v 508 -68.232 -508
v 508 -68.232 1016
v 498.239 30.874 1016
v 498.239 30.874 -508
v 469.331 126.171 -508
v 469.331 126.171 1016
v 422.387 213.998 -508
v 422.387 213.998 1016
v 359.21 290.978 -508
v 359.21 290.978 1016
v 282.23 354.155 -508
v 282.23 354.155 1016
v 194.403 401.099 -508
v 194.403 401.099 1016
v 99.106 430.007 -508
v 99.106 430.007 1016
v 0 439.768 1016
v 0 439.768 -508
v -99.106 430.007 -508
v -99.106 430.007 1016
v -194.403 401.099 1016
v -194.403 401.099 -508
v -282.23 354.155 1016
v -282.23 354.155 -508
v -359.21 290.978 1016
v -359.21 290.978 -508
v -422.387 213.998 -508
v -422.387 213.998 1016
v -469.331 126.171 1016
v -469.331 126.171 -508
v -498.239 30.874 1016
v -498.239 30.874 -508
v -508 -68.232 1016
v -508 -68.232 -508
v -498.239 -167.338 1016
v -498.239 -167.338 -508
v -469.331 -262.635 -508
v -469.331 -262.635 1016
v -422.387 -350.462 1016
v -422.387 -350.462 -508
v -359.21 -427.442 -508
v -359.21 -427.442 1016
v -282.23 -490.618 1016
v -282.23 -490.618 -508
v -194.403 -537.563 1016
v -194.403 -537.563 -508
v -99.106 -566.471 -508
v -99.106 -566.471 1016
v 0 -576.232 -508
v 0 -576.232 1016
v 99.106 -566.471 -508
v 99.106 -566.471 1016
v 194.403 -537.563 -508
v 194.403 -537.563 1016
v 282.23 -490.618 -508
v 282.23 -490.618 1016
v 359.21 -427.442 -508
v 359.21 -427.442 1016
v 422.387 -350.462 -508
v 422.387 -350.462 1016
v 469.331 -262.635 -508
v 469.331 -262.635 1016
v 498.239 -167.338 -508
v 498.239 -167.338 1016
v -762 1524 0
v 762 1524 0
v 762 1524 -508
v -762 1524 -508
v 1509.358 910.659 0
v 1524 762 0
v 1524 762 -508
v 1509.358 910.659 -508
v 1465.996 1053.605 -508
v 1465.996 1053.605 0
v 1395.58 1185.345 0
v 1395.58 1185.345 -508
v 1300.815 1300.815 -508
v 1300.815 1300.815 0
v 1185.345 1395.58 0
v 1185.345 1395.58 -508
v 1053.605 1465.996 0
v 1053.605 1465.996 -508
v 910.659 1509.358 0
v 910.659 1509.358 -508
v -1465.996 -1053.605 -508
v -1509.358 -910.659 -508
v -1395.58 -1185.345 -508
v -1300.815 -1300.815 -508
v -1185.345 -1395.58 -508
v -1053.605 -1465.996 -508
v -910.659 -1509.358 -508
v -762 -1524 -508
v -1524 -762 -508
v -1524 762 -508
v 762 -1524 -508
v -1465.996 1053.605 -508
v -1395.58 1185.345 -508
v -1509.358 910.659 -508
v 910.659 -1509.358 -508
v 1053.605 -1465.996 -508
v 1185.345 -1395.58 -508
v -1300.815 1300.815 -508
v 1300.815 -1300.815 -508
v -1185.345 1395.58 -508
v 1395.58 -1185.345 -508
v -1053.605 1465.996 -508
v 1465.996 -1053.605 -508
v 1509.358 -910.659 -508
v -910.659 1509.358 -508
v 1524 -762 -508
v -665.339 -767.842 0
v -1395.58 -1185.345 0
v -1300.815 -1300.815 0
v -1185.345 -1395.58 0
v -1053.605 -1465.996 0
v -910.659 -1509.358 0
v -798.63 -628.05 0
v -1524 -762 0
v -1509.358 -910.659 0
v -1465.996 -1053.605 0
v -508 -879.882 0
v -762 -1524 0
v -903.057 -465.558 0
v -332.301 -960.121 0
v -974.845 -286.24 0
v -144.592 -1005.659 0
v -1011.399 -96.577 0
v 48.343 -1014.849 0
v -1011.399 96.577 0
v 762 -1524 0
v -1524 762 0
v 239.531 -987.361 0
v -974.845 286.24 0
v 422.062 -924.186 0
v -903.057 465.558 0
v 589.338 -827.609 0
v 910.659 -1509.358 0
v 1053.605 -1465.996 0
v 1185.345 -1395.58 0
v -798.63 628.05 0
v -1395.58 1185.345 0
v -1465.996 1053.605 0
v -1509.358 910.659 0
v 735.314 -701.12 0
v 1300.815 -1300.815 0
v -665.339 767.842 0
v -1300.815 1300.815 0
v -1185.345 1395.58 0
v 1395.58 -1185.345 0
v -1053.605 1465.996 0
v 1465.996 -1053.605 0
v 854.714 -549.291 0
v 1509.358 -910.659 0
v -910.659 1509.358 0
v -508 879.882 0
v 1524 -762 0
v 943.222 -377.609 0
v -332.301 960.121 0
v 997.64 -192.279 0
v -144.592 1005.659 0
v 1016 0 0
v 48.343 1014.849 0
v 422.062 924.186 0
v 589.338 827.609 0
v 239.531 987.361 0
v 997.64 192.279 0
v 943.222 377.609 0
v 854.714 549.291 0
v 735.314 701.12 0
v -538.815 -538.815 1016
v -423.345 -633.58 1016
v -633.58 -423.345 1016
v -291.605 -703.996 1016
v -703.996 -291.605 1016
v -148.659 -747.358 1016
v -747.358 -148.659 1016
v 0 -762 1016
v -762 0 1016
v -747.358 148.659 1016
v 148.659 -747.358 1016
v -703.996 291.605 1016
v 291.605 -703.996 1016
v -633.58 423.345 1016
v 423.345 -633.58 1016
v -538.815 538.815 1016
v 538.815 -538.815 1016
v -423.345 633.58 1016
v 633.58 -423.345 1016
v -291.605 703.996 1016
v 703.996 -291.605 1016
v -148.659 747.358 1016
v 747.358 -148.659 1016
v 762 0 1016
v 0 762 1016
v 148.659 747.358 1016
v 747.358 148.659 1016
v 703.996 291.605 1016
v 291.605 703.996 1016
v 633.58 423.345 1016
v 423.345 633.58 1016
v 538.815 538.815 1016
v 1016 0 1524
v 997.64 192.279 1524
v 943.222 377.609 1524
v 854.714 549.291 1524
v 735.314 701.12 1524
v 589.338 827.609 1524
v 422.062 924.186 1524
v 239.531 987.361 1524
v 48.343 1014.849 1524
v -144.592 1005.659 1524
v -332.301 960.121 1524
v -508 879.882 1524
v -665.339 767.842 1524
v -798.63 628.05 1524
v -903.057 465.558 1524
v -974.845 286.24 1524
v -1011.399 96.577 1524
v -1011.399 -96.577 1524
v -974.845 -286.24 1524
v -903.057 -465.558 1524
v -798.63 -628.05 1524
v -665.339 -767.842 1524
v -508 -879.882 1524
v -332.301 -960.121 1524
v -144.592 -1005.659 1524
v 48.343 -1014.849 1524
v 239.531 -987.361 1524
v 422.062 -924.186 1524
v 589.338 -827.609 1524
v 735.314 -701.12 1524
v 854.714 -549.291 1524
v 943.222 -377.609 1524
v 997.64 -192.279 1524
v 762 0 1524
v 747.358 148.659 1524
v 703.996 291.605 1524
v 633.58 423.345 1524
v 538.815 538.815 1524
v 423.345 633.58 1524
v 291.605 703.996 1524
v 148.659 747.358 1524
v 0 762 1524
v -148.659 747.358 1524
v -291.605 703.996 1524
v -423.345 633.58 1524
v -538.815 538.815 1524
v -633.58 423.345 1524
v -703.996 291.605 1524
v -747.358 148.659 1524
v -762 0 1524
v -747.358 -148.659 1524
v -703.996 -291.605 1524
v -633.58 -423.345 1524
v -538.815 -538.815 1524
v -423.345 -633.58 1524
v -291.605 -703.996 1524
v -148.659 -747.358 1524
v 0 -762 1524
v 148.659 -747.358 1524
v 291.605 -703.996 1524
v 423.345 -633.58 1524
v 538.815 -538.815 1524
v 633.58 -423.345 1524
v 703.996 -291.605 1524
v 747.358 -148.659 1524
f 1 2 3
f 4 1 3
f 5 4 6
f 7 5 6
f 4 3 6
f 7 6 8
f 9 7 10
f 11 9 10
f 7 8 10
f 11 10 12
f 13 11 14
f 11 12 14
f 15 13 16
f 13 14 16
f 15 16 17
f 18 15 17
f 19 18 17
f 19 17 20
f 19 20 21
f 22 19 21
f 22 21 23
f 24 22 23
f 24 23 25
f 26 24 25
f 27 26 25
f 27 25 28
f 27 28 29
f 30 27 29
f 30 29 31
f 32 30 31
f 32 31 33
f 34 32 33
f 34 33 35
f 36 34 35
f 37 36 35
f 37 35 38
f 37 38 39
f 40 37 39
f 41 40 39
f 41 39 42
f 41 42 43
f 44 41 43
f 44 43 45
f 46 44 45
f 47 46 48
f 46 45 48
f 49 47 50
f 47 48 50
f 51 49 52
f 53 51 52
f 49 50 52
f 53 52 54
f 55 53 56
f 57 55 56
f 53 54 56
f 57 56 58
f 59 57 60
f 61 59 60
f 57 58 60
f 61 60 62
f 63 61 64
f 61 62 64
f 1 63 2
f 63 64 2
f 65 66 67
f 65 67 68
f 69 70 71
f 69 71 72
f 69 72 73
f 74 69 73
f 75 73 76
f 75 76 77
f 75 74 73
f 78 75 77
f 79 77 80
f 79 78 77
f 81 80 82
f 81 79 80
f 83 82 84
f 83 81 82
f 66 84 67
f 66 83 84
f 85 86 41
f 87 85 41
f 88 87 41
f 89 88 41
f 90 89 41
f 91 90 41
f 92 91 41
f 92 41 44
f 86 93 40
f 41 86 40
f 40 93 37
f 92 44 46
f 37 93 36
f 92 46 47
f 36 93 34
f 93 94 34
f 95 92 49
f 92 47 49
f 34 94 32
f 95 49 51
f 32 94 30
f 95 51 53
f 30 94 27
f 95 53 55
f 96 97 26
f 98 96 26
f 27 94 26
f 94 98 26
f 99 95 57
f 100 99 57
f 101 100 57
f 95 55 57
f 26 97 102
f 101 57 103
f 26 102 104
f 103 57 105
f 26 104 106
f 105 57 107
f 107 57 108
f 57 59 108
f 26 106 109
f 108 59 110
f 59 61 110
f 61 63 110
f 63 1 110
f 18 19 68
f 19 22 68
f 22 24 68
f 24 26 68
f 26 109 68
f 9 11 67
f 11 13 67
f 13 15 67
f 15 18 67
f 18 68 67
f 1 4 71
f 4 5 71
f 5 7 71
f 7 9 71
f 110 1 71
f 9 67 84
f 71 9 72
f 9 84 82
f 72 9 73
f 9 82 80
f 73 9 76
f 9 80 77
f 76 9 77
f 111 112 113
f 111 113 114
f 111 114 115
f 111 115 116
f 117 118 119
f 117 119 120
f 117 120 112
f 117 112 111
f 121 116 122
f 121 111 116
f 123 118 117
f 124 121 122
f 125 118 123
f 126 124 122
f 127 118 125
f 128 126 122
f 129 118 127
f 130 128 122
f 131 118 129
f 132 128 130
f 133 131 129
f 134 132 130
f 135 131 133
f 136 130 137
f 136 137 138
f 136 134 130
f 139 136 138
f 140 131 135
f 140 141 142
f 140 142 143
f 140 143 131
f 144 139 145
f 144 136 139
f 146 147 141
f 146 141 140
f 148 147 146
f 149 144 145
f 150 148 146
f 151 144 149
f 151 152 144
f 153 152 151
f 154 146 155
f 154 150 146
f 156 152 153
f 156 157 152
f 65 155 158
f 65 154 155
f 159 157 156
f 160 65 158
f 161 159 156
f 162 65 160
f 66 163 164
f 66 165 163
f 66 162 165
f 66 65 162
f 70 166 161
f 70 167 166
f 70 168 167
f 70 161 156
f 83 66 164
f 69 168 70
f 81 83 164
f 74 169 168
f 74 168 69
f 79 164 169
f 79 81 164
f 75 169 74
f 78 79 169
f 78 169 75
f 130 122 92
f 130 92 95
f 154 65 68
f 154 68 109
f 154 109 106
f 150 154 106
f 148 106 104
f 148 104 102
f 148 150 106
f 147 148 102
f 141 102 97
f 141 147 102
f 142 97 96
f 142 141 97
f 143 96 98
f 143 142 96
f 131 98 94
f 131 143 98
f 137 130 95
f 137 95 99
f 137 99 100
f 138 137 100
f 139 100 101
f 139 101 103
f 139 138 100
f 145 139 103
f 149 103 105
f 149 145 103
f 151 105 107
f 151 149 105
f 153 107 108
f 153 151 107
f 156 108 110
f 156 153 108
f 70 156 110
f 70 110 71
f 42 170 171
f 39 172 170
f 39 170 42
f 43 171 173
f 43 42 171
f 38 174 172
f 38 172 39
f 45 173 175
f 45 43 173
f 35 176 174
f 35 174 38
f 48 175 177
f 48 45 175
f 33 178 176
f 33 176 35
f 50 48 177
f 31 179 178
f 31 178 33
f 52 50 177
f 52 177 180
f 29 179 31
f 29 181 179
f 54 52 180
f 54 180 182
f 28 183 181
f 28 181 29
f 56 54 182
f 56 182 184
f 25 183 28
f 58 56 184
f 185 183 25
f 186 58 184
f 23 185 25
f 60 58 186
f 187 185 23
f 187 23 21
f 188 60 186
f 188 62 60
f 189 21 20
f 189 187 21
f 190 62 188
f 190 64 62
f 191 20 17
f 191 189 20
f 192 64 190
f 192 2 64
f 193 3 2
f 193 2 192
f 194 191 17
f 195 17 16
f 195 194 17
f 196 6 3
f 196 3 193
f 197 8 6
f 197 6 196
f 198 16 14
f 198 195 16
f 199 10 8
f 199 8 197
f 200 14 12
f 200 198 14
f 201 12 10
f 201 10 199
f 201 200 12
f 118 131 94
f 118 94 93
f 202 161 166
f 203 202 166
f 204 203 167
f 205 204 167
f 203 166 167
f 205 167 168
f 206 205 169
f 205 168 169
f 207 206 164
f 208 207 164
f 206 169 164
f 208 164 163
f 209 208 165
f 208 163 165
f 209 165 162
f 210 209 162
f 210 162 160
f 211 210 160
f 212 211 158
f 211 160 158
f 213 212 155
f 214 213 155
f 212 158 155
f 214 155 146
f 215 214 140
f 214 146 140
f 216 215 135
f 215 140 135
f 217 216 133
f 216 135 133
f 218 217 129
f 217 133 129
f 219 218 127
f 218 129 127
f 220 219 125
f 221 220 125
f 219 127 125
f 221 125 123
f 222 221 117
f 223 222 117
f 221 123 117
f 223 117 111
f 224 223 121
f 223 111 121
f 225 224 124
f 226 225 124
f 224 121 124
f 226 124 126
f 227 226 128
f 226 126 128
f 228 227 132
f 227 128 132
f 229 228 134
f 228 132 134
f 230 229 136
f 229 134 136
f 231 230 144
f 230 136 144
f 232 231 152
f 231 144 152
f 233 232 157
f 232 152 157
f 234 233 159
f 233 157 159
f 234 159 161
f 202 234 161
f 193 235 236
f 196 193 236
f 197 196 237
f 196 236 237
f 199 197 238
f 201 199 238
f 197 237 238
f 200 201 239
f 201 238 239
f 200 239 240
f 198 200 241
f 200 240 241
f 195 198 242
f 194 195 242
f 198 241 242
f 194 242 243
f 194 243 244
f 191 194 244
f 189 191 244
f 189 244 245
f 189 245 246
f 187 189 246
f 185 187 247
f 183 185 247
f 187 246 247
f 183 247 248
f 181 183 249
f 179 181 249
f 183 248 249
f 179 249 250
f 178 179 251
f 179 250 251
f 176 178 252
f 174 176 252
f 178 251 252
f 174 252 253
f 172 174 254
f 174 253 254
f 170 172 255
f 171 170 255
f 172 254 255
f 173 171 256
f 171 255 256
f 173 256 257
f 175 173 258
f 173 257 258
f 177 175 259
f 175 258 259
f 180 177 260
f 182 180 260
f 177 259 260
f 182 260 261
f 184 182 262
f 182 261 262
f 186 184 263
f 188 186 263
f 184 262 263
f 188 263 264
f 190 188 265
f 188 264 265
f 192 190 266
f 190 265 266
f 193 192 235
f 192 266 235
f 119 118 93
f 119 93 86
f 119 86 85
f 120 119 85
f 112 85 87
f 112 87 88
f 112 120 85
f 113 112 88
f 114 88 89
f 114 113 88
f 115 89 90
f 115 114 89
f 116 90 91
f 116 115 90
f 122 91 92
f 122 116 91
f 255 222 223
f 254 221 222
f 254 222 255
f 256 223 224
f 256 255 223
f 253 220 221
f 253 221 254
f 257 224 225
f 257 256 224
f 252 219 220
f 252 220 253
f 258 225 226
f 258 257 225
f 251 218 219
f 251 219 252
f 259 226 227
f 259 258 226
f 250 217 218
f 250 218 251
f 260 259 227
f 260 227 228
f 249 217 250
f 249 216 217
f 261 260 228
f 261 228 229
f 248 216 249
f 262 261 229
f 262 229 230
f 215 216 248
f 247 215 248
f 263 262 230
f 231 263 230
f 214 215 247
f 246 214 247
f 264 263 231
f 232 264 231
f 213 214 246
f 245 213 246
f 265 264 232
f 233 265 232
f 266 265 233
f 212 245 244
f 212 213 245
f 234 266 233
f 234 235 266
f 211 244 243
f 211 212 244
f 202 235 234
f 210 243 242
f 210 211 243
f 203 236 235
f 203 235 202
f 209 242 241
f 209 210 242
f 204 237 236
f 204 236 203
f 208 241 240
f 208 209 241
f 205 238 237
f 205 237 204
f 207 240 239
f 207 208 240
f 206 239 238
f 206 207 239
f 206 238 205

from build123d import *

# Parameters (mm, degrees)
F1_DEPTH = 508
F2_R     = 1016
F3_DEPTH = 1524
F4_R     = 762
F5_DEPTH = 508
F6_R     = 508
F7_DEPTH = 2032


with BuildPart() as f1:
    # F0 (on Top) → F1 (new body)
    with BuildSketch(Plane.XY):
        with BuildLine():
            Line((-762, -1524), (762, -1524))
            ThreePointArc((762, -1524), (1300.815367, -1300.815367), (1524, -762))
            Line((1524, -762), (1524, 762))
            ThreePointArc((1524, 762), (1300.815367, 1300.815367), (762, 1524))
            Line((762, 1524), (-762, 1524))
            ThreePointArc((-762, 1524), (-1300.815367, 1300.815367), (-1524, 762))
            Line((-1524, 762), (-1524, -762))
            ThreePointArc((-1524, -762), (-1300.815367, -1300.815367), (-762, -1524))
        make_face()
    extrude(amount=-F1_DEPTH)

    # F2 (on face) → F3 (join)
    with BuildSketch(Plane.XY):
        Circle(F2_R)
    extrude(amount=F3_DEPTH)

    # F4 (on face) → F5 (cut)
    with BuildSketch(Plane.XY.offset(1524)):
        Circle(F4_R)
    extrude(amount=-F5_DEPTH, mode=Mode.SUBTRACT)

    # F6 (on face) → F7 (cut)
    with BuildSketch(Plane.XY.offset(1016)):
        with Locations((0, -68.231903)):
            Circle(F6_R)
    extrude(amount=-F7_DEPTH, mode=Mode.SUBTRACT)


solid = f1.part
